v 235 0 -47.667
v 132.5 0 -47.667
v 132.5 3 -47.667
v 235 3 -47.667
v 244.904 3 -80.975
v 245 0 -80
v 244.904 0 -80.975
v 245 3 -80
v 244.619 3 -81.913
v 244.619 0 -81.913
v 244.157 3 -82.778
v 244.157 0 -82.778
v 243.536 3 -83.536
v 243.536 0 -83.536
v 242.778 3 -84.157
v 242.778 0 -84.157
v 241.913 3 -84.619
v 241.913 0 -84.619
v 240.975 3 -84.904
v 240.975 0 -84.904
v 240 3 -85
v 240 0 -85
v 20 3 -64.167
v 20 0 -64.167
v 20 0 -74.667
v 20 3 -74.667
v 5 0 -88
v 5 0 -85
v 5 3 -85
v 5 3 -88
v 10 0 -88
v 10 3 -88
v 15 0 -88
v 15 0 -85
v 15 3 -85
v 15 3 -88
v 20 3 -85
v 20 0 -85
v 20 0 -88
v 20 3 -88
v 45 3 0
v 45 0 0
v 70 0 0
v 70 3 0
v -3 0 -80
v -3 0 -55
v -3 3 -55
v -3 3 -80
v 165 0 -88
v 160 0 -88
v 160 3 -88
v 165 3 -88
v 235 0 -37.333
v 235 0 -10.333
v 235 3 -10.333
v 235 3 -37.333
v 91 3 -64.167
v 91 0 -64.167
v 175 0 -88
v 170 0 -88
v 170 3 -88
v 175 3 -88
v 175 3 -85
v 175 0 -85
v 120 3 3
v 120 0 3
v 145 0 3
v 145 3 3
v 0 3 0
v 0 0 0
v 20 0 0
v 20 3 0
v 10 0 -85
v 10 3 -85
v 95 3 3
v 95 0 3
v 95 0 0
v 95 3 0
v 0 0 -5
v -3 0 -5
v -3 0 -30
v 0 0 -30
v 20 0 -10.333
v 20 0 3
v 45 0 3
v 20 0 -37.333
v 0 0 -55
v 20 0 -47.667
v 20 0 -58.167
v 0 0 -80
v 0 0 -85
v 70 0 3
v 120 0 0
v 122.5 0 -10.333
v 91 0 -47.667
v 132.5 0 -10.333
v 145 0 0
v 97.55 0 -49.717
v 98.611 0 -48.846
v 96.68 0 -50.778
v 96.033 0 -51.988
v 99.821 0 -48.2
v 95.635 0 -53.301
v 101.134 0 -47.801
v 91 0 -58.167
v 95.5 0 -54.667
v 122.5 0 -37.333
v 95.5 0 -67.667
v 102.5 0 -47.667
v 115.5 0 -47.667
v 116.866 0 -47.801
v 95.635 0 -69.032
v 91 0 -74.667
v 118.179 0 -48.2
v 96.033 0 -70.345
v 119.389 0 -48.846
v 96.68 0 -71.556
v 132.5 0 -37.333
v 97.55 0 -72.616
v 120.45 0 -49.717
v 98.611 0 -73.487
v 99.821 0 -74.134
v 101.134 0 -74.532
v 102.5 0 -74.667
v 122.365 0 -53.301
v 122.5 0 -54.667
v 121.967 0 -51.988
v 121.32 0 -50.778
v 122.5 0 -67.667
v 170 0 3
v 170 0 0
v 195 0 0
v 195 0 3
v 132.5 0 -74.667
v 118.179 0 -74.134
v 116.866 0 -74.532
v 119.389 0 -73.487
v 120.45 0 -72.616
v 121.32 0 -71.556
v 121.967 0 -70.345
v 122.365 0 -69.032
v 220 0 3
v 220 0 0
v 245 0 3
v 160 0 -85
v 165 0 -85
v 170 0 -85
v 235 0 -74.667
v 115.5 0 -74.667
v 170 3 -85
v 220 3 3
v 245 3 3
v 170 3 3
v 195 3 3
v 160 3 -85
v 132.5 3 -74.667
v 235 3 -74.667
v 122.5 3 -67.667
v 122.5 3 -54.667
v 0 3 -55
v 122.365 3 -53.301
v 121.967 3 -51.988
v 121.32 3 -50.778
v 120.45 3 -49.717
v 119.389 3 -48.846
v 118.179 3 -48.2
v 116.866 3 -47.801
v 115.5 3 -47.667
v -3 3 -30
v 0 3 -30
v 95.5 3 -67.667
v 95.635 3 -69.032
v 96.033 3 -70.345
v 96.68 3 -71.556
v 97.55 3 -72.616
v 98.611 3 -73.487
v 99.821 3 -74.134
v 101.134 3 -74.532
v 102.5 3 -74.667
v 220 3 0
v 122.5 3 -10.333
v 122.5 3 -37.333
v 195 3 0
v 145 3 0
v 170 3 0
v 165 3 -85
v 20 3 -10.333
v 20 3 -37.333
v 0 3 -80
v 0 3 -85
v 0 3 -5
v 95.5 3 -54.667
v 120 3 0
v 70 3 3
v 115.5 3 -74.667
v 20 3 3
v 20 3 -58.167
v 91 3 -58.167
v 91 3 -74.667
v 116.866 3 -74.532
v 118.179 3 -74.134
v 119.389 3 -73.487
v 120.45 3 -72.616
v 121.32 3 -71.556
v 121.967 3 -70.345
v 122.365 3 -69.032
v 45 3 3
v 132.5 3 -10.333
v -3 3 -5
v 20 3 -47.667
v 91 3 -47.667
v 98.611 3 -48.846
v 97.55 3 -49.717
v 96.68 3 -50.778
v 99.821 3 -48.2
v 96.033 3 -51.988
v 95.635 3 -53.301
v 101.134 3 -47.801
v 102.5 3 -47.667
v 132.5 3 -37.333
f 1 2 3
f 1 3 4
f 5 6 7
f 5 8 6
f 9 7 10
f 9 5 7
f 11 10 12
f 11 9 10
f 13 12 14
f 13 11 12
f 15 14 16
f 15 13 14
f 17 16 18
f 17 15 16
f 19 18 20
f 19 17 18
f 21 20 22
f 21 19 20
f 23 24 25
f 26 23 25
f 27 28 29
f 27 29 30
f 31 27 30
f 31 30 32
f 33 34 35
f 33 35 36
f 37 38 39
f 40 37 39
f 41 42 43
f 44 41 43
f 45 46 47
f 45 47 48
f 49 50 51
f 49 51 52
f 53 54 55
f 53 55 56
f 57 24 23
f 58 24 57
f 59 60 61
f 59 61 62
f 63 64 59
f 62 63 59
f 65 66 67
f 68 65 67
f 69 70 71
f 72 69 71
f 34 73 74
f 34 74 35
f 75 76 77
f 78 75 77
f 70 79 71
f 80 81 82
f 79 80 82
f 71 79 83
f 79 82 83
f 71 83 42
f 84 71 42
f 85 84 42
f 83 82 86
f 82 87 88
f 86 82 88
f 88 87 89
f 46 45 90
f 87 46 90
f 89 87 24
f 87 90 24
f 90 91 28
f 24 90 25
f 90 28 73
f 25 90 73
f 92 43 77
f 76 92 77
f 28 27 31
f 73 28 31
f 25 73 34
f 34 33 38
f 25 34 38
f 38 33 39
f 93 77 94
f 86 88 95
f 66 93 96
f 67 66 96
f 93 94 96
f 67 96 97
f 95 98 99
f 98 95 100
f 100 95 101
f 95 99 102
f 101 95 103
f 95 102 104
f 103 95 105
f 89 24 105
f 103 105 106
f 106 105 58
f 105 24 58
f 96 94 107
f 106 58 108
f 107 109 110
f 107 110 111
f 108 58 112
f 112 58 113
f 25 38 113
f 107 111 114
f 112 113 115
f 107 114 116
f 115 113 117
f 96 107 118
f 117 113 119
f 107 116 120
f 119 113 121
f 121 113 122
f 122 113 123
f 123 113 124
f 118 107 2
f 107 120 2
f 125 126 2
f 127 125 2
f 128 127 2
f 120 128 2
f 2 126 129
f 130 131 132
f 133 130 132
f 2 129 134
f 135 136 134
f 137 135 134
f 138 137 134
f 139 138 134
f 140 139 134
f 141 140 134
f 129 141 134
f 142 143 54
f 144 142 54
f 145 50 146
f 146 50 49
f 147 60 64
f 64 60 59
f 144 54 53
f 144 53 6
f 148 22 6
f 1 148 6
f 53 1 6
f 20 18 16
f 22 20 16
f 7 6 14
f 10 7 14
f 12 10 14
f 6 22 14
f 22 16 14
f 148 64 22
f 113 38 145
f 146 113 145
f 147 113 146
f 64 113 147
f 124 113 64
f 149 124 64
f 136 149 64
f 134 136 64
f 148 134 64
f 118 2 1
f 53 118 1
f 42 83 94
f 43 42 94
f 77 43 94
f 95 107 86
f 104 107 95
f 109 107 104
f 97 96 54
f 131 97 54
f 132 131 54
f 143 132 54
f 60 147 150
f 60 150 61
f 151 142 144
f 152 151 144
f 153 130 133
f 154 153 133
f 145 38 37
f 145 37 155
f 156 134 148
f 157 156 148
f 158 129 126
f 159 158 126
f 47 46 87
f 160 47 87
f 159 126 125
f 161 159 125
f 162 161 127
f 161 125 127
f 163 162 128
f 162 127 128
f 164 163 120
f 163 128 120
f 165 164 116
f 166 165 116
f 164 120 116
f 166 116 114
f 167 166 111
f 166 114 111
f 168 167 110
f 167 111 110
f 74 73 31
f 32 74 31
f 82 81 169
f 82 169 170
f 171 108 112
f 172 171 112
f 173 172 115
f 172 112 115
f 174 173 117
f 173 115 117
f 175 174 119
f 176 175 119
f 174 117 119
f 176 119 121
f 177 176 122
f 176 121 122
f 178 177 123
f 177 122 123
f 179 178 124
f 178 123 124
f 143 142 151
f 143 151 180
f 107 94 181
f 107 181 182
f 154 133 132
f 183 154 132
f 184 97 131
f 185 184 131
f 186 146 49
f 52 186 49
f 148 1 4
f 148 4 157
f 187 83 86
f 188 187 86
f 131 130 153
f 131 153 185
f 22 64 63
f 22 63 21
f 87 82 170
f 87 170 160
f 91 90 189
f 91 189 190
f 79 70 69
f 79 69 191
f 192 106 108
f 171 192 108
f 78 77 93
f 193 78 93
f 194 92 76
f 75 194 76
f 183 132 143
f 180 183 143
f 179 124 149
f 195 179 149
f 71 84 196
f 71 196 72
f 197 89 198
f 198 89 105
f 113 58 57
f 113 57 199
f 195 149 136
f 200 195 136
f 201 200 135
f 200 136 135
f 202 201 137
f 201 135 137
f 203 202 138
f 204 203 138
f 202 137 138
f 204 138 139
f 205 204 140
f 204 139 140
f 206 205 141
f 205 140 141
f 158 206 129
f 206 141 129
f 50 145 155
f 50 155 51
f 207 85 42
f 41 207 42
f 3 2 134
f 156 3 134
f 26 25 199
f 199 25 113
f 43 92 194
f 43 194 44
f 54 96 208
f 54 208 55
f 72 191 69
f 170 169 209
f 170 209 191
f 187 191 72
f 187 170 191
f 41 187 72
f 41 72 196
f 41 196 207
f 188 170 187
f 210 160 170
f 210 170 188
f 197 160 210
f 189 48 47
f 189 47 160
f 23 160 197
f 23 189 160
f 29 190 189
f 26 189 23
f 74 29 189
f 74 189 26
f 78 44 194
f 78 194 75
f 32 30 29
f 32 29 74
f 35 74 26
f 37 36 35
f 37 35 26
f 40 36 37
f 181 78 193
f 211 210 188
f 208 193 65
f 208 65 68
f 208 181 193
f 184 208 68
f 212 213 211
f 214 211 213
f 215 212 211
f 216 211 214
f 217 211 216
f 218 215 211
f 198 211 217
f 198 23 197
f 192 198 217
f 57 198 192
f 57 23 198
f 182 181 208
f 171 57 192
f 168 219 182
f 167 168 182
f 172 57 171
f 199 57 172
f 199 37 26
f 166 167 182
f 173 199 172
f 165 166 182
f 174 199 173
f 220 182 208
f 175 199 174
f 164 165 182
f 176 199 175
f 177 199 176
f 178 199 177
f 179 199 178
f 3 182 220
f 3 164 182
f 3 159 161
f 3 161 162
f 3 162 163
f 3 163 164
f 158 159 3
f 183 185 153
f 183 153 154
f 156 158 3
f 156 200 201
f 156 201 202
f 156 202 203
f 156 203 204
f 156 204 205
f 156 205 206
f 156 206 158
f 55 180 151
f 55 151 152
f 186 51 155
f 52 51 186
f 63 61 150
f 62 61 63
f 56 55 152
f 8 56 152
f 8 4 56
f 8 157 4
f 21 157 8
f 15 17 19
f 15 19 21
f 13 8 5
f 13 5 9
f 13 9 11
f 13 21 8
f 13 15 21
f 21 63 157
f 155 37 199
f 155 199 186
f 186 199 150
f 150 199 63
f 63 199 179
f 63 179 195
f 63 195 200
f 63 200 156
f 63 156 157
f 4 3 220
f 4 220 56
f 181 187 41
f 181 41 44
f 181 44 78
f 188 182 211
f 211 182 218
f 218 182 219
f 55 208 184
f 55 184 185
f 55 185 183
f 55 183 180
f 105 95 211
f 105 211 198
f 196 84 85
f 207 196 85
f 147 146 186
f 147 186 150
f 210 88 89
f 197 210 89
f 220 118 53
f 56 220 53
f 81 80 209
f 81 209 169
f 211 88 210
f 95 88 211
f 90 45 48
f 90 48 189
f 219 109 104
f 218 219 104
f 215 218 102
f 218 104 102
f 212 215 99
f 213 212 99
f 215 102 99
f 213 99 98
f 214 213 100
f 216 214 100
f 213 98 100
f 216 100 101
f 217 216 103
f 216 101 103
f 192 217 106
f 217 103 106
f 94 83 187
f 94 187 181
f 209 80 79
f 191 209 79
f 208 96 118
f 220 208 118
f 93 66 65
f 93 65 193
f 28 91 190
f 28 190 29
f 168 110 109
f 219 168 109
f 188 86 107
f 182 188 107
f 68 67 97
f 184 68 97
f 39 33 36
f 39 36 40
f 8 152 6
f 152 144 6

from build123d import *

# Parameters (mm, degrees)
SKICA1_W                = 245
SKICA1_H                = 85
SKICA1_W_2              = 102.5
SKICA1_H_2              = 27
SKICA1_W_3              = 71
SKICA1_H_3              = 10.5
P_IDAT_VYSUNUT_M1_DEPTH = 3
SKICA2_W                = 3
SKICA2_H                = 25
SKICA2_W_2              = 25
SKICA2_H_2              = 3
P_IDAT_VYSUNUT_M2_DEPTH = 3
SKICA3_W                = 5
SKICA3_H                = 3
P_IDAT_VYSUNUT_M3_DEPTH = 3
ZAOBLIT1_R              = 5
SKICA7_W                = 5
SKICA7_H                = 3
P_IDAT_VYSUNUT_M6_DEPTH = 3


with BuildPart() as part:
    # Skica1 → Přidat vysunutím1 (new body)
    with BuildSketch(Plane(origin=(0, 0, 0), x_dir=(1, 0, 0), z_dir=(0, 1, 0))):
        with Locations((122.5, 42.5)):
            Rectangle(SKICA1_W, SKICA1_H)
        with Locations((71.25, 23.833333333)):
            Rectangle(SKICA1_W_2, SKICA1_H_2, mode=Mode.SUBTRACT)
        with Locations((55.5, 69.416666667)):
            Rectangle(SKICA1_W_3, SKICA1_H_3, mode=Mode.SUBTRACT)
        with Locations((183.75, 23.833333333)):
            Rectangle(SKICA1_W_2, SKICA1_H_2, mode=Mode.SUBTRACT)
        with Locations((183.75, 61.166666667)):
            Rectangle(SKICA1_W_2, SKICA1_H_2, mode=Mode.SUBTRACT)
        with BuildLine():
            Line((102.5, 74.666666667), (115.5, 74.666666667))
            ThreePointArc((115.5, 74.666666667), (120.449747468, 72.616414135), (122.5, 67.666666667))
            Line((122.5, 67.666666667), (122.5, 54.666666667))
            ThreePointArc((122.5, 54.666666667), (120.449747468, 49.716919198), (115.5, 47.666666667))
            Line((115.5, 47.666666667), (102.5, 47.666666667))
            ThreePointArc((102.5, 47.666666667), (97.550252532, 49.716919198), (95.5, 54.666666667))
            Line((95.5, 54.666666667), (95.5, 67.666666667))
            ThreePointArc((95.5, 67.666666667), (97.550252532, 72.616414135), (102.5, 74.666666667))
        make_face(mode=Mode.SUBTRACT)
        with Locations((55.5, 52.916666667)):
            Rectangle(SKICA1_W_3, SKICA1_H_3, mode=Mode.SUBTRACT)
    extrude(amount=P_IDAT_VYSUNUT_M1_DEPTH)

    # Skica2 → Přidat vysunutím2 (add)
    with BuildSketch(Plane(origin=(0, 0, 0), x_dir=(1, 0, 0), z_dir=(0, 1, 0))):
        with Locations((-1.5, 17.5)):
            Rectangle(SKICA2_W, SKICA2_H)
        with Locations((-1.5, 67.5)):
            Rectangle(SKICA2_W, SKICA2_H)
        with Locations((232.5, -1.5)):
            Rectangle(SKICA2_W_2, SKICA2_H_2)
        with Locations((182.5, -1.5)):
            Rectangle(SKICA2_W_2, SKICA2_H_2)
        with Locations((132.5, -1.5)):
            Rectangle(SKICA2_W_2, SKICA2_H_2)
        with Locations((82.5, -1.5)):
            Rectangle(SKICA2_W_2, SKICA2_H_2)
        with Locations((32.5, -1.5)):
            Rectangle(SKICA2_W_2, SKICA2_H_2)
    extrude(amount=P_IDAT_VYSUNUT_M2_DEPTH)

    # Skica3 → Přidat vysunutím3 (add)
    with BuildSketch(Plane(origin=(0, 0, 0), x_dir=(1, 0, 0), z_dir=(0, 1, 0))):
        with Locations((7.5, 86.5)):
            Rectangle(SKICA3_W, SKICA3_H)
        with Locations((17.5, 86.5)):
            Rectangle(SKICA3_W, SKICA3_H)
    extrude(amount=P_IDAT_VYSUNUT_M3_DEPTH)

    # Zaoblit1
    zaoblit1_edges = [part.edges().sort_by_distance(p)[0] for p in [
        (245, 1.5, -85),
    ]]
    fillet(zaoblit1_edges, radius=ZAOBLIT1_R)

    # Skica7 → Přidat vysunutím6 (add)
    with BuildSketch(Plane(origin=(0, 0, 0), x_dir=(1, 0, 0), z_dir=(0, 1, 0))):
        with Locations((162.5, 86.5)):
            Rectangle(SKICA7_W, SKICA7_H)
        with Locations((172.5, 86.5)):
            Rectangle(SKICA7_W, SKICA7_H)
    extrude(amount=P_IDAT_VYSUNUT_M6_DEPTH)


solid = part.part
